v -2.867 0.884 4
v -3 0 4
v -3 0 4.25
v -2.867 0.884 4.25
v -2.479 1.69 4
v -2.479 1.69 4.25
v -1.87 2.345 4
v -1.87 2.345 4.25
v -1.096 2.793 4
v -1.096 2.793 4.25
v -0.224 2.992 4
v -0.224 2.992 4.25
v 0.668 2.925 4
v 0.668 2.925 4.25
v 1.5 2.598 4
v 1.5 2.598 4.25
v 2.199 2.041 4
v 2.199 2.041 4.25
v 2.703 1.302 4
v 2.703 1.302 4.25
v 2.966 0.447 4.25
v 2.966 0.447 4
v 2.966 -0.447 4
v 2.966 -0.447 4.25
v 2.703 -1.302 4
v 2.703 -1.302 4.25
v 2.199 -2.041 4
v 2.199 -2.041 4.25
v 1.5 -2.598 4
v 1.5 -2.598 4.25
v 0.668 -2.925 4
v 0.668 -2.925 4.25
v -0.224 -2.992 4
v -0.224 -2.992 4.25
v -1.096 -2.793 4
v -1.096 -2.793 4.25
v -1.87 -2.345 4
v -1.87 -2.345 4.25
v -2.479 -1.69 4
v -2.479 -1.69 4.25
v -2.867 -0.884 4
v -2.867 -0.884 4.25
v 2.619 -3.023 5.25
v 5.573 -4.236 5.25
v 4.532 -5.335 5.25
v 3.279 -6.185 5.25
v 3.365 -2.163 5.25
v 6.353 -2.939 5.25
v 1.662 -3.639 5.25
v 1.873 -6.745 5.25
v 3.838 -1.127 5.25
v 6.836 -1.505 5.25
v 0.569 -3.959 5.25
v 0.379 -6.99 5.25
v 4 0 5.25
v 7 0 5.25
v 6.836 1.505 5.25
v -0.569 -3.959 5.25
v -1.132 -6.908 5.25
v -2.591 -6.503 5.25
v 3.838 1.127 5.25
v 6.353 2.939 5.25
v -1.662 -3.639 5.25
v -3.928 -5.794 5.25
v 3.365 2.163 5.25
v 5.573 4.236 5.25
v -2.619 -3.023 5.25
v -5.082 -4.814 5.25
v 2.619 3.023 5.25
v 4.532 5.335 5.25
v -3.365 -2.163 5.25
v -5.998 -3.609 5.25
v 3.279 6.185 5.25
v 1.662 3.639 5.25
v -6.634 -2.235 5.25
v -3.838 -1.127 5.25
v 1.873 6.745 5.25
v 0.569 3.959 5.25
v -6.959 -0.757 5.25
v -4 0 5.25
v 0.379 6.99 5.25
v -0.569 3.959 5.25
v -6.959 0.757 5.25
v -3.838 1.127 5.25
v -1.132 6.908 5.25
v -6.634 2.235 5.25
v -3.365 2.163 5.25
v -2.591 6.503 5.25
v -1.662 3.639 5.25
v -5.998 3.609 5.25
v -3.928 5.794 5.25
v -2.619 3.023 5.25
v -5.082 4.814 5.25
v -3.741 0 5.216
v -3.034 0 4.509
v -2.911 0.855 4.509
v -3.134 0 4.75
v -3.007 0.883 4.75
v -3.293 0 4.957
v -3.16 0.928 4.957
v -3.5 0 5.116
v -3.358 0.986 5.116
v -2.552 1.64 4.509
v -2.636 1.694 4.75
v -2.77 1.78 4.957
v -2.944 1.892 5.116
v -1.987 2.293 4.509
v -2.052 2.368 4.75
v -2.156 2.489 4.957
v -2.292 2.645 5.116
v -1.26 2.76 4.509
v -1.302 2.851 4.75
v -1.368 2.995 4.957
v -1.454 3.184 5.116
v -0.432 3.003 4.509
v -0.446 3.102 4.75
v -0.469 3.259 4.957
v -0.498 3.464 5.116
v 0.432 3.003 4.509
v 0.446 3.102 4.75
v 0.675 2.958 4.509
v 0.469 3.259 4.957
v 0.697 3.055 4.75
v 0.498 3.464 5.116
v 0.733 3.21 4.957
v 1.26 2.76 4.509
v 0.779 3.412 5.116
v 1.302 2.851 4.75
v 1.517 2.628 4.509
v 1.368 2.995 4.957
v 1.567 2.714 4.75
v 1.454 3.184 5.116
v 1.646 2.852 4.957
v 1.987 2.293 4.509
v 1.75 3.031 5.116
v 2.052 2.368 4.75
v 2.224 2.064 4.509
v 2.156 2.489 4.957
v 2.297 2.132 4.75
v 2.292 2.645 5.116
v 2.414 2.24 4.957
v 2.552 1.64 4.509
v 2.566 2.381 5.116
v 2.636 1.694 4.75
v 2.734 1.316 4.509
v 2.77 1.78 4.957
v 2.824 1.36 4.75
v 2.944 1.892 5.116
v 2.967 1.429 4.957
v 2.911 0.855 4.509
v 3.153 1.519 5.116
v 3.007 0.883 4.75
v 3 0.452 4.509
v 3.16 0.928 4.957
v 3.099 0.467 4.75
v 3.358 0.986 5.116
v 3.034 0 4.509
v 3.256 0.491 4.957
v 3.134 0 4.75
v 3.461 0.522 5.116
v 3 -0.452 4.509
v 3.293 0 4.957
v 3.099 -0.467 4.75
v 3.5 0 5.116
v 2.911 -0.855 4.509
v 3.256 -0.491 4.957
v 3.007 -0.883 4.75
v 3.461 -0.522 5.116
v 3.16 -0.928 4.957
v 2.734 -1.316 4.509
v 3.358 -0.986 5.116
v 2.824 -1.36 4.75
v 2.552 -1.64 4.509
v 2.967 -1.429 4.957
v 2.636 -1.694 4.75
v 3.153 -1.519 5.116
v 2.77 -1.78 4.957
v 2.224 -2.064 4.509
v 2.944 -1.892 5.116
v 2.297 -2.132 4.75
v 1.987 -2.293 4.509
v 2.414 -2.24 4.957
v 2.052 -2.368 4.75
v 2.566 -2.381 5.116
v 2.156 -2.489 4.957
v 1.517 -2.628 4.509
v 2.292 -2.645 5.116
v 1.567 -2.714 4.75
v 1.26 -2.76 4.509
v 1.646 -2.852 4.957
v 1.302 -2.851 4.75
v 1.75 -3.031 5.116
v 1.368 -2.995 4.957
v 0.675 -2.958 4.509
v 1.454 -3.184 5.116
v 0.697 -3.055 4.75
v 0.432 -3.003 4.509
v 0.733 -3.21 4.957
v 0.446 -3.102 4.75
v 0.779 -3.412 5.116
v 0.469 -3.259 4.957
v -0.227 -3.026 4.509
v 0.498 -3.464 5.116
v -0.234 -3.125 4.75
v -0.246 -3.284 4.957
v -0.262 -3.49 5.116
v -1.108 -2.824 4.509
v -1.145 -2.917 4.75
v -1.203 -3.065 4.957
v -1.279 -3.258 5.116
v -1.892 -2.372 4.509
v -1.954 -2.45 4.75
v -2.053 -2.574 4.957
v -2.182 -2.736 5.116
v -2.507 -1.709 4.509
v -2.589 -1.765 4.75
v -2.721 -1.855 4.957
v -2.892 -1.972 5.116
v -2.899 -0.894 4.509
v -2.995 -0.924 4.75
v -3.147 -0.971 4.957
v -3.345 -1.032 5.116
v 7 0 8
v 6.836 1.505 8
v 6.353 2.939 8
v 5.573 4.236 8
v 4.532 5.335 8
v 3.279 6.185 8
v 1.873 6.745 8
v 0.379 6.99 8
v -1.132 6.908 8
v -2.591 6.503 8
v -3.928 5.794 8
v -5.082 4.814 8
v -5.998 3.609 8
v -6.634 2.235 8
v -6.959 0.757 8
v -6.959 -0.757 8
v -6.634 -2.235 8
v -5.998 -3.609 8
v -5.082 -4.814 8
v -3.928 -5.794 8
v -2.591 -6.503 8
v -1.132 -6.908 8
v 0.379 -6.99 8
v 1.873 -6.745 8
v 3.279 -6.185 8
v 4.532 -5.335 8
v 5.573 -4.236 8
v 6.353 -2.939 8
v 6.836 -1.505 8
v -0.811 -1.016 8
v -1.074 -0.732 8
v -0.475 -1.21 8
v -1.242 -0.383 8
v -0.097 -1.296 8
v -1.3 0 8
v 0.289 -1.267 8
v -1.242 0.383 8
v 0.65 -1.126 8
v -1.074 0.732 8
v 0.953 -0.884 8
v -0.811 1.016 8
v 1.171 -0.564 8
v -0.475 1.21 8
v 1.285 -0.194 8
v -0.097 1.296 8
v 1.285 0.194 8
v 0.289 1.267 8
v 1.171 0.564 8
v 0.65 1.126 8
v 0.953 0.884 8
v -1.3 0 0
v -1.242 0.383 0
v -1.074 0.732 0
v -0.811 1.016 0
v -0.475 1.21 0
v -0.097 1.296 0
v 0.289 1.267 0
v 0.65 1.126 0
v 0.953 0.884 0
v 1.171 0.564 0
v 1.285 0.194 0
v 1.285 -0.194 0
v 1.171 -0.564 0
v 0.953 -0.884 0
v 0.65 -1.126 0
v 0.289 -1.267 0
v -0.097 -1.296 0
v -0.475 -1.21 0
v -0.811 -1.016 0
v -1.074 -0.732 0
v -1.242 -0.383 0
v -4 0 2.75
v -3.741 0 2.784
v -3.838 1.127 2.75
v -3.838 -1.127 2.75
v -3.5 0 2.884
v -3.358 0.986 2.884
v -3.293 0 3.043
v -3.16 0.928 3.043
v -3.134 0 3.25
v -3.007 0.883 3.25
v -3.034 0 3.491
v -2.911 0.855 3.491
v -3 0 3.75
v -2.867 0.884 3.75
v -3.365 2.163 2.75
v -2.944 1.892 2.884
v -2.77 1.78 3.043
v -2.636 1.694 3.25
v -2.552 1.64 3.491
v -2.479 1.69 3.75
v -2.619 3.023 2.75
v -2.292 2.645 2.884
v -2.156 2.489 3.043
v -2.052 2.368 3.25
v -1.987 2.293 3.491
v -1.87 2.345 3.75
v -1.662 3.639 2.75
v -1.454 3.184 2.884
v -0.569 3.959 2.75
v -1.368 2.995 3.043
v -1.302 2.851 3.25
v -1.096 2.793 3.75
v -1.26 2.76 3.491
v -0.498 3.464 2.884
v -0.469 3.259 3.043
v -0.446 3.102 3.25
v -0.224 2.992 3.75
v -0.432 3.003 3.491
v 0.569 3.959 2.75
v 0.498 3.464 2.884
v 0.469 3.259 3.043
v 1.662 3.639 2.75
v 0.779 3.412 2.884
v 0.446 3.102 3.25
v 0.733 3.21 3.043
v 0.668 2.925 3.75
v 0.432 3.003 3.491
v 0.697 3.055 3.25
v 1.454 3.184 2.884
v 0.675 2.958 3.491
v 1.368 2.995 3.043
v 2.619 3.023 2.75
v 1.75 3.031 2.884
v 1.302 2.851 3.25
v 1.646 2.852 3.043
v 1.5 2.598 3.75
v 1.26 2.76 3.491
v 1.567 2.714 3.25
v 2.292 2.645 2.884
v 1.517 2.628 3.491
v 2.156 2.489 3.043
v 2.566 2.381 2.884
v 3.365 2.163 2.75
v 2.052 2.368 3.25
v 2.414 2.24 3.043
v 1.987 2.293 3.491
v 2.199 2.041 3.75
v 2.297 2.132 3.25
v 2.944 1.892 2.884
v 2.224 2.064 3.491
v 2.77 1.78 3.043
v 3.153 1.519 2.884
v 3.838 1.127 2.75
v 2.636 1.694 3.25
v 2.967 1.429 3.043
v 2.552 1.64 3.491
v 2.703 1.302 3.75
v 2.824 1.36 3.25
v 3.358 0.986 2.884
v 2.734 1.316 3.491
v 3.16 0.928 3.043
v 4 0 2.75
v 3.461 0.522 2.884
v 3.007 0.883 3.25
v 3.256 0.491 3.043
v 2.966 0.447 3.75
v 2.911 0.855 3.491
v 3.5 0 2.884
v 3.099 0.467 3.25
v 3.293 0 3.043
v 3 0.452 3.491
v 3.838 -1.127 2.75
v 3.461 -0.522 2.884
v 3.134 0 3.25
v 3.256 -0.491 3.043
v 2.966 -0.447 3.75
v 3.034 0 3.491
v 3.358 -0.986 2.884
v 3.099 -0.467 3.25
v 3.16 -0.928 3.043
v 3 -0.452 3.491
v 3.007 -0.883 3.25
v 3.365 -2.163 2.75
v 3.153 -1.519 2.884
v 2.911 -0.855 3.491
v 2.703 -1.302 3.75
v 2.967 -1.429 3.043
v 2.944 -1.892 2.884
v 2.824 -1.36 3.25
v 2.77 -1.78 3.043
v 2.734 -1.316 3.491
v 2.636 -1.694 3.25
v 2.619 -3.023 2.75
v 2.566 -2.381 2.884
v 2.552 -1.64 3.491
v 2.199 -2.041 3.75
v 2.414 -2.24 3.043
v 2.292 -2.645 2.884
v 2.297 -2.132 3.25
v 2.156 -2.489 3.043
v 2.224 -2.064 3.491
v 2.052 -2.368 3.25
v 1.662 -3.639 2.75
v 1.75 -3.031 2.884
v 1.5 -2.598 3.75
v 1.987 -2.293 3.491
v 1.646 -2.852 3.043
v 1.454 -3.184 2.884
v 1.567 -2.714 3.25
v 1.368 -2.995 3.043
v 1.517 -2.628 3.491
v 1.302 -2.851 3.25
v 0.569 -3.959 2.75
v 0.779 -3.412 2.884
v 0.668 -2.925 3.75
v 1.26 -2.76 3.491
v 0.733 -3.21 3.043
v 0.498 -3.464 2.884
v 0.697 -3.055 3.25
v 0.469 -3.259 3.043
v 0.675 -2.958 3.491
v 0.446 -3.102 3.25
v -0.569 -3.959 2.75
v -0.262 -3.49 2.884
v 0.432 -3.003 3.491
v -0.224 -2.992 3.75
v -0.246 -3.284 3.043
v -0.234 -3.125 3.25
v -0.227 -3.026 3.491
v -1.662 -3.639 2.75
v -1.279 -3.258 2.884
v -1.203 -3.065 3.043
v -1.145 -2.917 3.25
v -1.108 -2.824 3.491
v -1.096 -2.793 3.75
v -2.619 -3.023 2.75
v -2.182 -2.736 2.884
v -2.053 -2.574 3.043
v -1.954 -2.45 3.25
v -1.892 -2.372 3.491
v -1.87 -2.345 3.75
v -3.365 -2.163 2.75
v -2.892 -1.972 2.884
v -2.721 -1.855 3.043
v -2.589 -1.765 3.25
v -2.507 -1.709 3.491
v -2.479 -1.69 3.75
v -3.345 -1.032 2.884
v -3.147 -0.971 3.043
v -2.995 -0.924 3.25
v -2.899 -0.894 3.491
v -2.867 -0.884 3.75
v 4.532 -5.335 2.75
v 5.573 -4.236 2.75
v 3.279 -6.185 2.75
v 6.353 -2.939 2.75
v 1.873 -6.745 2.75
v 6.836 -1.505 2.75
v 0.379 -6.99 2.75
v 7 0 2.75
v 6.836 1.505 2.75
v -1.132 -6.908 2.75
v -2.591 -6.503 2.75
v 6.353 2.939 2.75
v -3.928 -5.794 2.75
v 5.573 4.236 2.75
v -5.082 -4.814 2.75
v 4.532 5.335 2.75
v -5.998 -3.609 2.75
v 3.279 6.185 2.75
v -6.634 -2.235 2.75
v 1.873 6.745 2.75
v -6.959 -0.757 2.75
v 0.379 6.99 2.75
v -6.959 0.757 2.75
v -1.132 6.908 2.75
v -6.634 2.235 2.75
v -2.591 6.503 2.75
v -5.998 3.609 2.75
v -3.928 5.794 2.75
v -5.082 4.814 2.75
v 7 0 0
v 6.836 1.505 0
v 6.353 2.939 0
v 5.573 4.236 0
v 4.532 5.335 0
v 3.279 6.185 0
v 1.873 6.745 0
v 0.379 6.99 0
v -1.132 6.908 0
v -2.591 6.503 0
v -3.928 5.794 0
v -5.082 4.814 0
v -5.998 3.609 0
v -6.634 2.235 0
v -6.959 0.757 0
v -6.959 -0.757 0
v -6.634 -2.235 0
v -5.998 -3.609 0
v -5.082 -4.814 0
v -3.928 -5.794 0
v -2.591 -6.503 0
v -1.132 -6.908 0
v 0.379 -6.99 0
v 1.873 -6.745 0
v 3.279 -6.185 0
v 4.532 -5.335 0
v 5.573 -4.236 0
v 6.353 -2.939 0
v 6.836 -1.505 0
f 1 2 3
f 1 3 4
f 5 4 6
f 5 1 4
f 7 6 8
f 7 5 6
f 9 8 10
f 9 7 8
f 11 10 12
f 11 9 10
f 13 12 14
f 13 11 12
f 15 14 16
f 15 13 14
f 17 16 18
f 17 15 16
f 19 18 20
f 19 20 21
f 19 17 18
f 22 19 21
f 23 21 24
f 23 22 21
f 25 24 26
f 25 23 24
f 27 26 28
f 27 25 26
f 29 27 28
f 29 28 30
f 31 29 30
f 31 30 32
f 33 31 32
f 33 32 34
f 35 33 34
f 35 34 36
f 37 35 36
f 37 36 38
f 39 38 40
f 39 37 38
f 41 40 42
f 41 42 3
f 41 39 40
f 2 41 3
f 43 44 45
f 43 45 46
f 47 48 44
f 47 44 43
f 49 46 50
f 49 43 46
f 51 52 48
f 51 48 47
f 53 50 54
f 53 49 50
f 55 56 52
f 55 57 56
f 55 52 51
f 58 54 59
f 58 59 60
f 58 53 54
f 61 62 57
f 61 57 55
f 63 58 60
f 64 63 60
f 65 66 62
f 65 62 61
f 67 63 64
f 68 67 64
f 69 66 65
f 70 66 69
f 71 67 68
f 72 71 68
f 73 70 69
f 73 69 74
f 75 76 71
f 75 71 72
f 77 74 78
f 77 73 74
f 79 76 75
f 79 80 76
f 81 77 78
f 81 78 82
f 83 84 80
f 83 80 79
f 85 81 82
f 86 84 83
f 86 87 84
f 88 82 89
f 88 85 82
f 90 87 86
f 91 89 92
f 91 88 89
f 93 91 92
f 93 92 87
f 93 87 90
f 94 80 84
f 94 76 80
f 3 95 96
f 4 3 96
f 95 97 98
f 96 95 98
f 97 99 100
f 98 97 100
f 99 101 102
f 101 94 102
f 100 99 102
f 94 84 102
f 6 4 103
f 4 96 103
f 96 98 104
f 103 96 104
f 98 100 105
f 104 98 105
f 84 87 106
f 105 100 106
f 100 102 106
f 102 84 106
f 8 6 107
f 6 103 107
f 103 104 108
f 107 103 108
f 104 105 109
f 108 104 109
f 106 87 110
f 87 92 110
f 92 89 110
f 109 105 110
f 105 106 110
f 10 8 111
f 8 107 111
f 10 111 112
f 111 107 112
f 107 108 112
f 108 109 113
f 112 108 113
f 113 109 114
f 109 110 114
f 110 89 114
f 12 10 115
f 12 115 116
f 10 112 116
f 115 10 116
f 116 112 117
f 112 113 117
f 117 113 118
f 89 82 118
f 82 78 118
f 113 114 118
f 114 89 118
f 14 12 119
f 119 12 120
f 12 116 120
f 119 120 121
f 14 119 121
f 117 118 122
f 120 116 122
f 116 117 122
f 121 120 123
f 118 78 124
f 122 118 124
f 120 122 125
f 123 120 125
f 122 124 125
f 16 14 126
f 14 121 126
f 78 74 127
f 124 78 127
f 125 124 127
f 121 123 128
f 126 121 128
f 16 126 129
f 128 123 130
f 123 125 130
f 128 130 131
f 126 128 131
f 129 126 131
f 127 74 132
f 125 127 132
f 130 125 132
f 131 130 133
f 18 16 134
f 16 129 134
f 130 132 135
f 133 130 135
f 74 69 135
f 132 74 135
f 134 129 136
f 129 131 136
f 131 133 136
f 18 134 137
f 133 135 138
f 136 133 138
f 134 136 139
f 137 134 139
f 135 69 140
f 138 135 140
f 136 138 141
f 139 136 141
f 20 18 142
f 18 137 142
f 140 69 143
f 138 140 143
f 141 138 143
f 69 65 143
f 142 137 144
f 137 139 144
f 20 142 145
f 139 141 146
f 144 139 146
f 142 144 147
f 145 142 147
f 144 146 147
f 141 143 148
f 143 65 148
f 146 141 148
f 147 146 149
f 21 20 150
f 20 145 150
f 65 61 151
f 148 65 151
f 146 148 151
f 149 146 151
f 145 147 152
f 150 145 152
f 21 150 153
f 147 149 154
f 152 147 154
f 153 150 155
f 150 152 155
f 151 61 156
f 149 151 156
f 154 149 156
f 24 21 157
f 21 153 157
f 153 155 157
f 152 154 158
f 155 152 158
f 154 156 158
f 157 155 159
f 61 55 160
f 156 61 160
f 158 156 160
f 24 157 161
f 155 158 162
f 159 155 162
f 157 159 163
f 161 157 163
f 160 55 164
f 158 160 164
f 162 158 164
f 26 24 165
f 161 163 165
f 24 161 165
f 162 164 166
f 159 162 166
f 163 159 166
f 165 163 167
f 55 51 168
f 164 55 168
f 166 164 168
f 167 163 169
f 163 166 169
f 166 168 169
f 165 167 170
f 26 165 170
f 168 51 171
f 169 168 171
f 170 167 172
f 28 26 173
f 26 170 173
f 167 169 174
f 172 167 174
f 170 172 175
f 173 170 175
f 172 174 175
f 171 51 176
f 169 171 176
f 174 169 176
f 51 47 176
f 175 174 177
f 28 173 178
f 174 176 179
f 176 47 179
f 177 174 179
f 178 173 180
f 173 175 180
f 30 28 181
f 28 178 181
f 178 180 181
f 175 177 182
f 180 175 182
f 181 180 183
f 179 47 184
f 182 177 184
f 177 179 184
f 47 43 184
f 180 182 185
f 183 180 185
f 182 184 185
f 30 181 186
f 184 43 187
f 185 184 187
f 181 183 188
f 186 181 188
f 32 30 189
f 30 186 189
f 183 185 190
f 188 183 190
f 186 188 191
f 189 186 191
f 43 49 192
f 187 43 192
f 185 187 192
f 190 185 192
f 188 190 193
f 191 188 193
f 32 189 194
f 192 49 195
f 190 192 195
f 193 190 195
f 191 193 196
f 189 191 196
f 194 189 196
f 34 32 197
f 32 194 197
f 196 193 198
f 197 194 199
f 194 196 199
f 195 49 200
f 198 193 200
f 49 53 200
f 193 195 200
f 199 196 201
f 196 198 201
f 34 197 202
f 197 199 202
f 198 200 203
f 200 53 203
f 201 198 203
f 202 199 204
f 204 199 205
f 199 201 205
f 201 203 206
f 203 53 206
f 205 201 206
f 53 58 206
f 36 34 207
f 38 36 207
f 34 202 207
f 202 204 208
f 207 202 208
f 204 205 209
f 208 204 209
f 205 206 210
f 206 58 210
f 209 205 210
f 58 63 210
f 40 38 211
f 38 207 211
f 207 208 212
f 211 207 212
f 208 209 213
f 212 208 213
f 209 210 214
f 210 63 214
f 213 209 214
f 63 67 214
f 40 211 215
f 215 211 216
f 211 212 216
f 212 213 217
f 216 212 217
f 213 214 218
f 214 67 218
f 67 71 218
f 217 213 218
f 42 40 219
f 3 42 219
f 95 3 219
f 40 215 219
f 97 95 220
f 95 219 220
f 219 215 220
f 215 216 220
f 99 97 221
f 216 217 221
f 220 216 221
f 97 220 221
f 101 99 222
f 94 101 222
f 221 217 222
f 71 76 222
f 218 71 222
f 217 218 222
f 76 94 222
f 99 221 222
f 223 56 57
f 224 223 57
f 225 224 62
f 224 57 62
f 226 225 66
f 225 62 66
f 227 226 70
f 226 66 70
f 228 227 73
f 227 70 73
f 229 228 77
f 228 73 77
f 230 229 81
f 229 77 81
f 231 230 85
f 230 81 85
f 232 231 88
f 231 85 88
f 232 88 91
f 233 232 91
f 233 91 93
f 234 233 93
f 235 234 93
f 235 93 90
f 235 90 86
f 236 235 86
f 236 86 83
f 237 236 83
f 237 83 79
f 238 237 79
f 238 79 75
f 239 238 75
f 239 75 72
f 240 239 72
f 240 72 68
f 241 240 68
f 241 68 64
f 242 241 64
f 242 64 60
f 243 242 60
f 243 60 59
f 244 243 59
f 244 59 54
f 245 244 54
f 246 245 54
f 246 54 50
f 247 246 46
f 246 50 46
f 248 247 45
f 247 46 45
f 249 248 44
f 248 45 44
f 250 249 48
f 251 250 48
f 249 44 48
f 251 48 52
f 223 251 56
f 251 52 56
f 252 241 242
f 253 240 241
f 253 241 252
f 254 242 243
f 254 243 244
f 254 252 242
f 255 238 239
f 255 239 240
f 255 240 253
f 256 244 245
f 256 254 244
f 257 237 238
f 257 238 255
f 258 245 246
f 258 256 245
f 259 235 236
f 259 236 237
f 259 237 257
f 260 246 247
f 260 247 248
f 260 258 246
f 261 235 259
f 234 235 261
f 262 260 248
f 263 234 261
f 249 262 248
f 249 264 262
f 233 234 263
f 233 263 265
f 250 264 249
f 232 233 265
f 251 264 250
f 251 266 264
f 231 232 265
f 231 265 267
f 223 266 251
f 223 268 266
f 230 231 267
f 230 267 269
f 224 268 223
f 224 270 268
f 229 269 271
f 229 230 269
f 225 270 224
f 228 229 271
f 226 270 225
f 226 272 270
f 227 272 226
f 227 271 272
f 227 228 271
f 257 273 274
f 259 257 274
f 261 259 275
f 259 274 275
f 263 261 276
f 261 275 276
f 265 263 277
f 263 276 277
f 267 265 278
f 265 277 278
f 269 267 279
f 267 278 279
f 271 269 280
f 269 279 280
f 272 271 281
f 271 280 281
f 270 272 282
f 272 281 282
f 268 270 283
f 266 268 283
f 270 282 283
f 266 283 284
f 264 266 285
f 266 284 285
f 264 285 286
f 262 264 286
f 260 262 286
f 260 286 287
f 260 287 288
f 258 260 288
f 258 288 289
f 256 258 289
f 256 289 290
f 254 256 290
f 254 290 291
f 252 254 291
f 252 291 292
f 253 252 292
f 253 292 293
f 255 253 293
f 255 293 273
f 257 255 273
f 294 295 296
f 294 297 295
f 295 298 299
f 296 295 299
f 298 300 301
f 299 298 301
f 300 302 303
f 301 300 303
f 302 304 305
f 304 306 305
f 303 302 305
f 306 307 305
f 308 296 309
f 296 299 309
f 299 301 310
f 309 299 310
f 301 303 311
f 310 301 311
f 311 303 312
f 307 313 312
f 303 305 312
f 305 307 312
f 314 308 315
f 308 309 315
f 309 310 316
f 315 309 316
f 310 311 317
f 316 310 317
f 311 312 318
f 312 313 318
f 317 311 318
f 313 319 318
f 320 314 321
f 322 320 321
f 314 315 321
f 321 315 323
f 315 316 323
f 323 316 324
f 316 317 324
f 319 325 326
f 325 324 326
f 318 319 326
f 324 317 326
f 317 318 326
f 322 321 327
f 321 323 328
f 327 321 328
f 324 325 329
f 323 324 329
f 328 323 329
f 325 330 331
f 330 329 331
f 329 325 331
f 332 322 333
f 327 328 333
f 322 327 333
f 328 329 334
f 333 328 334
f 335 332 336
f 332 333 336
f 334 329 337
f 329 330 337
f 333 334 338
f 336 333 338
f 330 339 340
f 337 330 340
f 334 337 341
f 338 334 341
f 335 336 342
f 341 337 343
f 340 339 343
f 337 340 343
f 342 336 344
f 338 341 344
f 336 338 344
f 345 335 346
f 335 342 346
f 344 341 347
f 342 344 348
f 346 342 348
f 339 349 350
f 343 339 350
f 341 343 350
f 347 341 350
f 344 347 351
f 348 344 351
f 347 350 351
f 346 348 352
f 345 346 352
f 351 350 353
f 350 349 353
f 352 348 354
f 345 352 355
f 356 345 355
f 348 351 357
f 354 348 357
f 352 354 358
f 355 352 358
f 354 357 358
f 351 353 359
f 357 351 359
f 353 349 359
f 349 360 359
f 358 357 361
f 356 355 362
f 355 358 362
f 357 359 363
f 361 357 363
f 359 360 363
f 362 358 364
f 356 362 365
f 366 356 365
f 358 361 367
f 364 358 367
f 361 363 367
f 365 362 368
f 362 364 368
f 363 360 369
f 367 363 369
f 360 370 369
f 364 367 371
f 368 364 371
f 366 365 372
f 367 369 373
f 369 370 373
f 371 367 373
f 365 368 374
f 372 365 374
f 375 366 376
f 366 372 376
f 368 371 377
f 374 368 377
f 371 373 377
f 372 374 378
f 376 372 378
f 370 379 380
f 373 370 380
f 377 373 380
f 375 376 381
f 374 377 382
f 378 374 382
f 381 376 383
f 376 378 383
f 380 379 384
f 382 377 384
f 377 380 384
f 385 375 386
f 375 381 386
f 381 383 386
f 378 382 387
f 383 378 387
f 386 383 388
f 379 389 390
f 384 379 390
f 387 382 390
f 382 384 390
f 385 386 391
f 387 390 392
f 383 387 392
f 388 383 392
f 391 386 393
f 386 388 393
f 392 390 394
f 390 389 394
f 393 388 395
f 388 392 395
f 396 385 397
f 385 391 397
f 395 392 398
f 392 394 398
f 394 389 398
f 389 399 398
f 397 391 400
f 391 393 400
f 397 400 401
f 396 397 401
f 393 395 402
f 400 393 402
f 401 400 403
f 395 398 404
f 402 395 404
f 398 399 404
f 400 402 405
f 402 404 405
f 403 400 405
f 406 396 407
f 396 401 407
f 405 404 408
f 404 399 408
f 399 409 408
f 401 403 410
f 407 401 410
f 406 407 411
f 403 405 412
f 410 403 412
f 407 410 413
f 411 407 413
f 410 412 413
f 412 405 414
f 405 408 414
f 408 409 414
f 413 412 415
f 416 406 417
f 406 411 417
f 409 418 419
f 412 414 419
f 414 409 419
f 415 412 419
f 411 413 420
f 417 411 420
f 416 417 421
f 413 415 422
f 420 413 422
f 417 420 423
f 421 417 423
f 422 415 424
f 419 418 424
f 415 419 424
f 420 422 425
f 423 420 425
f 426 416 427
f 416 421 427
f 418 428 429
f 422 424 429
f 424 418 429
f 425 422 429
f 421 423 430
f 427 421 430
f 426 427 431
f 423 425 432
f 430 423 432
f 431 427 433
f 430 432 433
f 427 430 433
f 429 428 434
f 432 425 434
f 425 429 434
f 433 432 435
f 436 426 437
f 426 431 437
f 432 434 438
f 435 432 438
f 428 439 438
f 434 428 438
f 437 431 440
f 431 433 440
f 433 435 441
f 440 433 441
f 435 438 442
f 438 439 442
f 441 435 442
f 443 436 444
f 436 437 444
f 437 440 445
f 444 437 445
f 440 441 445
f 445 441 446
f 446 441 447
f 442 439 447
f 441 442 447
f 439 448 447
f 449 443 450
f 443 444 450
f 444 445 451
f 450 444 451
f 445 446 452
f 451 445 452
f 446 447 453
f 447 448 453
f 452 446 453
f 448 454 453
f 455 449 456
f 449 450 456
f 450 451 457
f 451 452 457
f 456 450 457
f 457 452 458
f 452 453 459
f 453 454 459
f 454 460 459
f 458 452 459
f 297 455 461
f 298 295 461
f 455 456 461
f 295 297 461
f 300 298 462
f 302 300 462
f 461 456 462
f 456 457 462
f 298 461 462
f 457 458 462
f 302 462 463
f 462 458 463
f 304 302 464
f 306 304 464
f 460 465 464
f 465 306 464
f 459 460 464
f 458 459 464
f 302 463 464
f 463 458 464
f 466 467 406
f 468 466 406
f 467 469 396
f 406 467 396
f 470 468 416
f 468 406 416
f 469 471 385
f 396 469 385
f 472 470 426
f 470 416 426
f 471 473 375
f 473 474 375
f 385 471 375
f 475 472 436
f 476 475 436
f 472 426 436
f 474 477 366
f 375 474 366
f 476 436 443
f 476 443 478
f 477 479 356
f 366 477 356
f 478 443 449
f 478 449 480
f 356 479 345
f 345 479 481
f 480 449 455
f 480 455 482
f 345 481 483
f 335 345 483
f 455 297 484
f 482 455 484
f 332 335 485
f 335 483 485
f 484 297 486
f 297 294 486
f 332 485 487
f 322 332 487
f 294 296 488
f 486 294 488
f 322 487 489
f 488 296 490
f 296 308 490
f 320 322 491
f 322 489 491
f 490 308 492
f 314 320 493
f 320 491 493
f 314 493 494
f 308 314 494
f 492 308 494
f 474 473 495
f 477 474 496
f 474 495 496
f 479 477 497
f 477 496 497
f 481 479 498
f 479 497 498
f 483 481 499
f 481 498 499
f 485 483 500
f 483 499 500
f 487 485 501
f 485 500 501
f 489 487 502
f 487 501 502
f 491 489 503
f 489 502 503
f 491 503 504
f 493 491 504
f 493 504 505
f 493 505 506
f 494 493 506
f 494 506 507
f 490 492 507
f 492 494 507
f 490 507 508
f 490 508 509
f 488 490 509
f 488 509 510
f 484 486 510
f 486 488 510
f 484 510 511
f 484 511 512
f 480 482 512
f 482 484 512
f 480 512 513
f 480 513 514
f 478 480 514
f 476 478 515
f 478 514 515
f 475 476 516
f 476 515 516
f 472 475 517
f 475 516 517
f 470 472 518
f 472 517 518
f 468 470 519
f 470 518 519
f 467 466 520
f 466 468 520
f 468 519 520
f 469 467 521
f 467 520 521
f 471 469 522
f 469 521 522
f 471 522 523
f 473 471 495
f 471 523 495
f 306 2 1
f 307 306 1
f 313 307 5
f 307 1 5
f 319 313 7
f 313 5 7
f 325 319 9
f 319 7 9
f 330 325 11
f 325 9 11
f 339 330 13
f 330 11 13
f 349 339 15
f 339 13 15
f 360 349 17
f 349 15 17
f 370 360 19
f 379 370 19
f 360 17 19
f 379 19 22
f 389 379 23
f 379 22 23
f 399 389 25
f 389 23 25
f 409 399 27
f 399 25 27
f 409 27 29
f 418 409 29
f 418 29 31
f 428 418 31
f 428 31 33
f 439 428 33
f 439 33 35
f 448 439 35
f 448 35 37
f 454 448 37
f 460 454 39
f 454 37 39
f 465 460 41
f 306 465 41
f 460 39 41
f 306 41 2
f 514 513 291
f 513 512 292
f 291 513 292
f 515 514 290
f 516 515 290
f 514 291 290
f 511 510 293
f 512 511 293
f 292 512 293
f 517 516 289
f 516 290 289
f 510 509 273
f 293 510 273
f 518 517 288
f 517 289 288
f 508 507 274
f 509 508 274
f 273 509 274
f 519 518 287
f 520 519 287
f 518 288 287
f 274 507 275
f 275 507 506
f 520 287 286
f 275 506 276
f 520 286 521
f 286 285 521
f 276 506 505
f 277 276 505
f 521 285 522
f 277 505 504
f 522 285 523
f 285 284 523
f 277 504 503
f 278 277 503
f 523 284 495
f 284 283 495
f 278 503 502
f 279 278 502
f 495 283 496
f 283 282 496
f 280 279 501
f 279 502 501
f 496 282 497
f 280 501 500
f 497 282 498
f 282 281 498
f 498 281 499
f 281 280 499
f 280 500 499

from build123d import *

# Parameters (mm, degrees)
ESQUISSE1_R                  = 7
BOSS_EXTRU_1_DEPTH           = 8
ESQUISSE2_R                  = 7
ESQUISSE2_R_2                = 3
ENL_V_MAT_EXTRU_2_DEPTH      = 1.25
ENL_V_MAT_EXTRU_2_DEPTH_BACK = 1.25
CONG_1_R                     = 1
ENL_V_MAT_EXTRU_3_REACH      = 10
ESQUISSE3_R                  = 1.3


with BuildPart() as part:
    # Esquisse1 → Boss.-Extru.1 (new body)
    with BuildSketch(Plane.XY):
        Circle(ESQUISSE1_R)
    extrude(amount=BOSS_EXTRU_1_DEPTH)

    # Esquisse2 → Enlèv. mat.-Extru.2 (cut, two sides)
    with BuildSketch(Plane(origin=(0, 0, 4), x_dir=(-1, 0, 0), z_dir=(0, 0, -1))) as enl_v_mat_extru_2_sk:
        Circle(ESQUISSE2_R)
        Circle(ESQUISSE2_R_2, mode=Mode.SUBTRACT)
    extrude(amount=ENL_V_MAT_EXTRU_2_DEPTH, mode=Mode.SUBTRACT)
    extrude(enl_v_mat_extru_2_sk.sketch, amount=-ENL_V_MAT_EXTRU_2_DEPTH_BACK, mode=Mode.SUBTRACT)

    # Congé1
    cong_1_edges = [part.edges().sort_by_distance(p)[0] for p in [
        (3, 0, 2.75),
        (3, 0, 5.25),
    ]]
    fillet(cong_1_edges, radius=CONG_1_R)

    # Esquisse3 → Enlèv. mat.-Extru.3 (cut, up to next)
    with BuildSketch(Plane(origin=(0, 0, 0), x_dir=(-1, 0, 0), z_dir=(0, 0, -1)), mode=Mode.PRIVATE) as enl_v_mat_extru_3_sk1:
        Circle(ESQUISSE3_R)
    enl_v_mat_extru_3_tool1 = extrude(enl_v_mat_extru_3_sk1.sketch, amount=-ENL_V_MAT_EXTRU_3_REACH, mode=Mode.PRIVATE) & part.part
    add(enl_v_mat_extru_3_tool1.solids().sort_by_distance((0, 0, 0))[0], mode=Mode.SUBTRACT)


solid = part.part
